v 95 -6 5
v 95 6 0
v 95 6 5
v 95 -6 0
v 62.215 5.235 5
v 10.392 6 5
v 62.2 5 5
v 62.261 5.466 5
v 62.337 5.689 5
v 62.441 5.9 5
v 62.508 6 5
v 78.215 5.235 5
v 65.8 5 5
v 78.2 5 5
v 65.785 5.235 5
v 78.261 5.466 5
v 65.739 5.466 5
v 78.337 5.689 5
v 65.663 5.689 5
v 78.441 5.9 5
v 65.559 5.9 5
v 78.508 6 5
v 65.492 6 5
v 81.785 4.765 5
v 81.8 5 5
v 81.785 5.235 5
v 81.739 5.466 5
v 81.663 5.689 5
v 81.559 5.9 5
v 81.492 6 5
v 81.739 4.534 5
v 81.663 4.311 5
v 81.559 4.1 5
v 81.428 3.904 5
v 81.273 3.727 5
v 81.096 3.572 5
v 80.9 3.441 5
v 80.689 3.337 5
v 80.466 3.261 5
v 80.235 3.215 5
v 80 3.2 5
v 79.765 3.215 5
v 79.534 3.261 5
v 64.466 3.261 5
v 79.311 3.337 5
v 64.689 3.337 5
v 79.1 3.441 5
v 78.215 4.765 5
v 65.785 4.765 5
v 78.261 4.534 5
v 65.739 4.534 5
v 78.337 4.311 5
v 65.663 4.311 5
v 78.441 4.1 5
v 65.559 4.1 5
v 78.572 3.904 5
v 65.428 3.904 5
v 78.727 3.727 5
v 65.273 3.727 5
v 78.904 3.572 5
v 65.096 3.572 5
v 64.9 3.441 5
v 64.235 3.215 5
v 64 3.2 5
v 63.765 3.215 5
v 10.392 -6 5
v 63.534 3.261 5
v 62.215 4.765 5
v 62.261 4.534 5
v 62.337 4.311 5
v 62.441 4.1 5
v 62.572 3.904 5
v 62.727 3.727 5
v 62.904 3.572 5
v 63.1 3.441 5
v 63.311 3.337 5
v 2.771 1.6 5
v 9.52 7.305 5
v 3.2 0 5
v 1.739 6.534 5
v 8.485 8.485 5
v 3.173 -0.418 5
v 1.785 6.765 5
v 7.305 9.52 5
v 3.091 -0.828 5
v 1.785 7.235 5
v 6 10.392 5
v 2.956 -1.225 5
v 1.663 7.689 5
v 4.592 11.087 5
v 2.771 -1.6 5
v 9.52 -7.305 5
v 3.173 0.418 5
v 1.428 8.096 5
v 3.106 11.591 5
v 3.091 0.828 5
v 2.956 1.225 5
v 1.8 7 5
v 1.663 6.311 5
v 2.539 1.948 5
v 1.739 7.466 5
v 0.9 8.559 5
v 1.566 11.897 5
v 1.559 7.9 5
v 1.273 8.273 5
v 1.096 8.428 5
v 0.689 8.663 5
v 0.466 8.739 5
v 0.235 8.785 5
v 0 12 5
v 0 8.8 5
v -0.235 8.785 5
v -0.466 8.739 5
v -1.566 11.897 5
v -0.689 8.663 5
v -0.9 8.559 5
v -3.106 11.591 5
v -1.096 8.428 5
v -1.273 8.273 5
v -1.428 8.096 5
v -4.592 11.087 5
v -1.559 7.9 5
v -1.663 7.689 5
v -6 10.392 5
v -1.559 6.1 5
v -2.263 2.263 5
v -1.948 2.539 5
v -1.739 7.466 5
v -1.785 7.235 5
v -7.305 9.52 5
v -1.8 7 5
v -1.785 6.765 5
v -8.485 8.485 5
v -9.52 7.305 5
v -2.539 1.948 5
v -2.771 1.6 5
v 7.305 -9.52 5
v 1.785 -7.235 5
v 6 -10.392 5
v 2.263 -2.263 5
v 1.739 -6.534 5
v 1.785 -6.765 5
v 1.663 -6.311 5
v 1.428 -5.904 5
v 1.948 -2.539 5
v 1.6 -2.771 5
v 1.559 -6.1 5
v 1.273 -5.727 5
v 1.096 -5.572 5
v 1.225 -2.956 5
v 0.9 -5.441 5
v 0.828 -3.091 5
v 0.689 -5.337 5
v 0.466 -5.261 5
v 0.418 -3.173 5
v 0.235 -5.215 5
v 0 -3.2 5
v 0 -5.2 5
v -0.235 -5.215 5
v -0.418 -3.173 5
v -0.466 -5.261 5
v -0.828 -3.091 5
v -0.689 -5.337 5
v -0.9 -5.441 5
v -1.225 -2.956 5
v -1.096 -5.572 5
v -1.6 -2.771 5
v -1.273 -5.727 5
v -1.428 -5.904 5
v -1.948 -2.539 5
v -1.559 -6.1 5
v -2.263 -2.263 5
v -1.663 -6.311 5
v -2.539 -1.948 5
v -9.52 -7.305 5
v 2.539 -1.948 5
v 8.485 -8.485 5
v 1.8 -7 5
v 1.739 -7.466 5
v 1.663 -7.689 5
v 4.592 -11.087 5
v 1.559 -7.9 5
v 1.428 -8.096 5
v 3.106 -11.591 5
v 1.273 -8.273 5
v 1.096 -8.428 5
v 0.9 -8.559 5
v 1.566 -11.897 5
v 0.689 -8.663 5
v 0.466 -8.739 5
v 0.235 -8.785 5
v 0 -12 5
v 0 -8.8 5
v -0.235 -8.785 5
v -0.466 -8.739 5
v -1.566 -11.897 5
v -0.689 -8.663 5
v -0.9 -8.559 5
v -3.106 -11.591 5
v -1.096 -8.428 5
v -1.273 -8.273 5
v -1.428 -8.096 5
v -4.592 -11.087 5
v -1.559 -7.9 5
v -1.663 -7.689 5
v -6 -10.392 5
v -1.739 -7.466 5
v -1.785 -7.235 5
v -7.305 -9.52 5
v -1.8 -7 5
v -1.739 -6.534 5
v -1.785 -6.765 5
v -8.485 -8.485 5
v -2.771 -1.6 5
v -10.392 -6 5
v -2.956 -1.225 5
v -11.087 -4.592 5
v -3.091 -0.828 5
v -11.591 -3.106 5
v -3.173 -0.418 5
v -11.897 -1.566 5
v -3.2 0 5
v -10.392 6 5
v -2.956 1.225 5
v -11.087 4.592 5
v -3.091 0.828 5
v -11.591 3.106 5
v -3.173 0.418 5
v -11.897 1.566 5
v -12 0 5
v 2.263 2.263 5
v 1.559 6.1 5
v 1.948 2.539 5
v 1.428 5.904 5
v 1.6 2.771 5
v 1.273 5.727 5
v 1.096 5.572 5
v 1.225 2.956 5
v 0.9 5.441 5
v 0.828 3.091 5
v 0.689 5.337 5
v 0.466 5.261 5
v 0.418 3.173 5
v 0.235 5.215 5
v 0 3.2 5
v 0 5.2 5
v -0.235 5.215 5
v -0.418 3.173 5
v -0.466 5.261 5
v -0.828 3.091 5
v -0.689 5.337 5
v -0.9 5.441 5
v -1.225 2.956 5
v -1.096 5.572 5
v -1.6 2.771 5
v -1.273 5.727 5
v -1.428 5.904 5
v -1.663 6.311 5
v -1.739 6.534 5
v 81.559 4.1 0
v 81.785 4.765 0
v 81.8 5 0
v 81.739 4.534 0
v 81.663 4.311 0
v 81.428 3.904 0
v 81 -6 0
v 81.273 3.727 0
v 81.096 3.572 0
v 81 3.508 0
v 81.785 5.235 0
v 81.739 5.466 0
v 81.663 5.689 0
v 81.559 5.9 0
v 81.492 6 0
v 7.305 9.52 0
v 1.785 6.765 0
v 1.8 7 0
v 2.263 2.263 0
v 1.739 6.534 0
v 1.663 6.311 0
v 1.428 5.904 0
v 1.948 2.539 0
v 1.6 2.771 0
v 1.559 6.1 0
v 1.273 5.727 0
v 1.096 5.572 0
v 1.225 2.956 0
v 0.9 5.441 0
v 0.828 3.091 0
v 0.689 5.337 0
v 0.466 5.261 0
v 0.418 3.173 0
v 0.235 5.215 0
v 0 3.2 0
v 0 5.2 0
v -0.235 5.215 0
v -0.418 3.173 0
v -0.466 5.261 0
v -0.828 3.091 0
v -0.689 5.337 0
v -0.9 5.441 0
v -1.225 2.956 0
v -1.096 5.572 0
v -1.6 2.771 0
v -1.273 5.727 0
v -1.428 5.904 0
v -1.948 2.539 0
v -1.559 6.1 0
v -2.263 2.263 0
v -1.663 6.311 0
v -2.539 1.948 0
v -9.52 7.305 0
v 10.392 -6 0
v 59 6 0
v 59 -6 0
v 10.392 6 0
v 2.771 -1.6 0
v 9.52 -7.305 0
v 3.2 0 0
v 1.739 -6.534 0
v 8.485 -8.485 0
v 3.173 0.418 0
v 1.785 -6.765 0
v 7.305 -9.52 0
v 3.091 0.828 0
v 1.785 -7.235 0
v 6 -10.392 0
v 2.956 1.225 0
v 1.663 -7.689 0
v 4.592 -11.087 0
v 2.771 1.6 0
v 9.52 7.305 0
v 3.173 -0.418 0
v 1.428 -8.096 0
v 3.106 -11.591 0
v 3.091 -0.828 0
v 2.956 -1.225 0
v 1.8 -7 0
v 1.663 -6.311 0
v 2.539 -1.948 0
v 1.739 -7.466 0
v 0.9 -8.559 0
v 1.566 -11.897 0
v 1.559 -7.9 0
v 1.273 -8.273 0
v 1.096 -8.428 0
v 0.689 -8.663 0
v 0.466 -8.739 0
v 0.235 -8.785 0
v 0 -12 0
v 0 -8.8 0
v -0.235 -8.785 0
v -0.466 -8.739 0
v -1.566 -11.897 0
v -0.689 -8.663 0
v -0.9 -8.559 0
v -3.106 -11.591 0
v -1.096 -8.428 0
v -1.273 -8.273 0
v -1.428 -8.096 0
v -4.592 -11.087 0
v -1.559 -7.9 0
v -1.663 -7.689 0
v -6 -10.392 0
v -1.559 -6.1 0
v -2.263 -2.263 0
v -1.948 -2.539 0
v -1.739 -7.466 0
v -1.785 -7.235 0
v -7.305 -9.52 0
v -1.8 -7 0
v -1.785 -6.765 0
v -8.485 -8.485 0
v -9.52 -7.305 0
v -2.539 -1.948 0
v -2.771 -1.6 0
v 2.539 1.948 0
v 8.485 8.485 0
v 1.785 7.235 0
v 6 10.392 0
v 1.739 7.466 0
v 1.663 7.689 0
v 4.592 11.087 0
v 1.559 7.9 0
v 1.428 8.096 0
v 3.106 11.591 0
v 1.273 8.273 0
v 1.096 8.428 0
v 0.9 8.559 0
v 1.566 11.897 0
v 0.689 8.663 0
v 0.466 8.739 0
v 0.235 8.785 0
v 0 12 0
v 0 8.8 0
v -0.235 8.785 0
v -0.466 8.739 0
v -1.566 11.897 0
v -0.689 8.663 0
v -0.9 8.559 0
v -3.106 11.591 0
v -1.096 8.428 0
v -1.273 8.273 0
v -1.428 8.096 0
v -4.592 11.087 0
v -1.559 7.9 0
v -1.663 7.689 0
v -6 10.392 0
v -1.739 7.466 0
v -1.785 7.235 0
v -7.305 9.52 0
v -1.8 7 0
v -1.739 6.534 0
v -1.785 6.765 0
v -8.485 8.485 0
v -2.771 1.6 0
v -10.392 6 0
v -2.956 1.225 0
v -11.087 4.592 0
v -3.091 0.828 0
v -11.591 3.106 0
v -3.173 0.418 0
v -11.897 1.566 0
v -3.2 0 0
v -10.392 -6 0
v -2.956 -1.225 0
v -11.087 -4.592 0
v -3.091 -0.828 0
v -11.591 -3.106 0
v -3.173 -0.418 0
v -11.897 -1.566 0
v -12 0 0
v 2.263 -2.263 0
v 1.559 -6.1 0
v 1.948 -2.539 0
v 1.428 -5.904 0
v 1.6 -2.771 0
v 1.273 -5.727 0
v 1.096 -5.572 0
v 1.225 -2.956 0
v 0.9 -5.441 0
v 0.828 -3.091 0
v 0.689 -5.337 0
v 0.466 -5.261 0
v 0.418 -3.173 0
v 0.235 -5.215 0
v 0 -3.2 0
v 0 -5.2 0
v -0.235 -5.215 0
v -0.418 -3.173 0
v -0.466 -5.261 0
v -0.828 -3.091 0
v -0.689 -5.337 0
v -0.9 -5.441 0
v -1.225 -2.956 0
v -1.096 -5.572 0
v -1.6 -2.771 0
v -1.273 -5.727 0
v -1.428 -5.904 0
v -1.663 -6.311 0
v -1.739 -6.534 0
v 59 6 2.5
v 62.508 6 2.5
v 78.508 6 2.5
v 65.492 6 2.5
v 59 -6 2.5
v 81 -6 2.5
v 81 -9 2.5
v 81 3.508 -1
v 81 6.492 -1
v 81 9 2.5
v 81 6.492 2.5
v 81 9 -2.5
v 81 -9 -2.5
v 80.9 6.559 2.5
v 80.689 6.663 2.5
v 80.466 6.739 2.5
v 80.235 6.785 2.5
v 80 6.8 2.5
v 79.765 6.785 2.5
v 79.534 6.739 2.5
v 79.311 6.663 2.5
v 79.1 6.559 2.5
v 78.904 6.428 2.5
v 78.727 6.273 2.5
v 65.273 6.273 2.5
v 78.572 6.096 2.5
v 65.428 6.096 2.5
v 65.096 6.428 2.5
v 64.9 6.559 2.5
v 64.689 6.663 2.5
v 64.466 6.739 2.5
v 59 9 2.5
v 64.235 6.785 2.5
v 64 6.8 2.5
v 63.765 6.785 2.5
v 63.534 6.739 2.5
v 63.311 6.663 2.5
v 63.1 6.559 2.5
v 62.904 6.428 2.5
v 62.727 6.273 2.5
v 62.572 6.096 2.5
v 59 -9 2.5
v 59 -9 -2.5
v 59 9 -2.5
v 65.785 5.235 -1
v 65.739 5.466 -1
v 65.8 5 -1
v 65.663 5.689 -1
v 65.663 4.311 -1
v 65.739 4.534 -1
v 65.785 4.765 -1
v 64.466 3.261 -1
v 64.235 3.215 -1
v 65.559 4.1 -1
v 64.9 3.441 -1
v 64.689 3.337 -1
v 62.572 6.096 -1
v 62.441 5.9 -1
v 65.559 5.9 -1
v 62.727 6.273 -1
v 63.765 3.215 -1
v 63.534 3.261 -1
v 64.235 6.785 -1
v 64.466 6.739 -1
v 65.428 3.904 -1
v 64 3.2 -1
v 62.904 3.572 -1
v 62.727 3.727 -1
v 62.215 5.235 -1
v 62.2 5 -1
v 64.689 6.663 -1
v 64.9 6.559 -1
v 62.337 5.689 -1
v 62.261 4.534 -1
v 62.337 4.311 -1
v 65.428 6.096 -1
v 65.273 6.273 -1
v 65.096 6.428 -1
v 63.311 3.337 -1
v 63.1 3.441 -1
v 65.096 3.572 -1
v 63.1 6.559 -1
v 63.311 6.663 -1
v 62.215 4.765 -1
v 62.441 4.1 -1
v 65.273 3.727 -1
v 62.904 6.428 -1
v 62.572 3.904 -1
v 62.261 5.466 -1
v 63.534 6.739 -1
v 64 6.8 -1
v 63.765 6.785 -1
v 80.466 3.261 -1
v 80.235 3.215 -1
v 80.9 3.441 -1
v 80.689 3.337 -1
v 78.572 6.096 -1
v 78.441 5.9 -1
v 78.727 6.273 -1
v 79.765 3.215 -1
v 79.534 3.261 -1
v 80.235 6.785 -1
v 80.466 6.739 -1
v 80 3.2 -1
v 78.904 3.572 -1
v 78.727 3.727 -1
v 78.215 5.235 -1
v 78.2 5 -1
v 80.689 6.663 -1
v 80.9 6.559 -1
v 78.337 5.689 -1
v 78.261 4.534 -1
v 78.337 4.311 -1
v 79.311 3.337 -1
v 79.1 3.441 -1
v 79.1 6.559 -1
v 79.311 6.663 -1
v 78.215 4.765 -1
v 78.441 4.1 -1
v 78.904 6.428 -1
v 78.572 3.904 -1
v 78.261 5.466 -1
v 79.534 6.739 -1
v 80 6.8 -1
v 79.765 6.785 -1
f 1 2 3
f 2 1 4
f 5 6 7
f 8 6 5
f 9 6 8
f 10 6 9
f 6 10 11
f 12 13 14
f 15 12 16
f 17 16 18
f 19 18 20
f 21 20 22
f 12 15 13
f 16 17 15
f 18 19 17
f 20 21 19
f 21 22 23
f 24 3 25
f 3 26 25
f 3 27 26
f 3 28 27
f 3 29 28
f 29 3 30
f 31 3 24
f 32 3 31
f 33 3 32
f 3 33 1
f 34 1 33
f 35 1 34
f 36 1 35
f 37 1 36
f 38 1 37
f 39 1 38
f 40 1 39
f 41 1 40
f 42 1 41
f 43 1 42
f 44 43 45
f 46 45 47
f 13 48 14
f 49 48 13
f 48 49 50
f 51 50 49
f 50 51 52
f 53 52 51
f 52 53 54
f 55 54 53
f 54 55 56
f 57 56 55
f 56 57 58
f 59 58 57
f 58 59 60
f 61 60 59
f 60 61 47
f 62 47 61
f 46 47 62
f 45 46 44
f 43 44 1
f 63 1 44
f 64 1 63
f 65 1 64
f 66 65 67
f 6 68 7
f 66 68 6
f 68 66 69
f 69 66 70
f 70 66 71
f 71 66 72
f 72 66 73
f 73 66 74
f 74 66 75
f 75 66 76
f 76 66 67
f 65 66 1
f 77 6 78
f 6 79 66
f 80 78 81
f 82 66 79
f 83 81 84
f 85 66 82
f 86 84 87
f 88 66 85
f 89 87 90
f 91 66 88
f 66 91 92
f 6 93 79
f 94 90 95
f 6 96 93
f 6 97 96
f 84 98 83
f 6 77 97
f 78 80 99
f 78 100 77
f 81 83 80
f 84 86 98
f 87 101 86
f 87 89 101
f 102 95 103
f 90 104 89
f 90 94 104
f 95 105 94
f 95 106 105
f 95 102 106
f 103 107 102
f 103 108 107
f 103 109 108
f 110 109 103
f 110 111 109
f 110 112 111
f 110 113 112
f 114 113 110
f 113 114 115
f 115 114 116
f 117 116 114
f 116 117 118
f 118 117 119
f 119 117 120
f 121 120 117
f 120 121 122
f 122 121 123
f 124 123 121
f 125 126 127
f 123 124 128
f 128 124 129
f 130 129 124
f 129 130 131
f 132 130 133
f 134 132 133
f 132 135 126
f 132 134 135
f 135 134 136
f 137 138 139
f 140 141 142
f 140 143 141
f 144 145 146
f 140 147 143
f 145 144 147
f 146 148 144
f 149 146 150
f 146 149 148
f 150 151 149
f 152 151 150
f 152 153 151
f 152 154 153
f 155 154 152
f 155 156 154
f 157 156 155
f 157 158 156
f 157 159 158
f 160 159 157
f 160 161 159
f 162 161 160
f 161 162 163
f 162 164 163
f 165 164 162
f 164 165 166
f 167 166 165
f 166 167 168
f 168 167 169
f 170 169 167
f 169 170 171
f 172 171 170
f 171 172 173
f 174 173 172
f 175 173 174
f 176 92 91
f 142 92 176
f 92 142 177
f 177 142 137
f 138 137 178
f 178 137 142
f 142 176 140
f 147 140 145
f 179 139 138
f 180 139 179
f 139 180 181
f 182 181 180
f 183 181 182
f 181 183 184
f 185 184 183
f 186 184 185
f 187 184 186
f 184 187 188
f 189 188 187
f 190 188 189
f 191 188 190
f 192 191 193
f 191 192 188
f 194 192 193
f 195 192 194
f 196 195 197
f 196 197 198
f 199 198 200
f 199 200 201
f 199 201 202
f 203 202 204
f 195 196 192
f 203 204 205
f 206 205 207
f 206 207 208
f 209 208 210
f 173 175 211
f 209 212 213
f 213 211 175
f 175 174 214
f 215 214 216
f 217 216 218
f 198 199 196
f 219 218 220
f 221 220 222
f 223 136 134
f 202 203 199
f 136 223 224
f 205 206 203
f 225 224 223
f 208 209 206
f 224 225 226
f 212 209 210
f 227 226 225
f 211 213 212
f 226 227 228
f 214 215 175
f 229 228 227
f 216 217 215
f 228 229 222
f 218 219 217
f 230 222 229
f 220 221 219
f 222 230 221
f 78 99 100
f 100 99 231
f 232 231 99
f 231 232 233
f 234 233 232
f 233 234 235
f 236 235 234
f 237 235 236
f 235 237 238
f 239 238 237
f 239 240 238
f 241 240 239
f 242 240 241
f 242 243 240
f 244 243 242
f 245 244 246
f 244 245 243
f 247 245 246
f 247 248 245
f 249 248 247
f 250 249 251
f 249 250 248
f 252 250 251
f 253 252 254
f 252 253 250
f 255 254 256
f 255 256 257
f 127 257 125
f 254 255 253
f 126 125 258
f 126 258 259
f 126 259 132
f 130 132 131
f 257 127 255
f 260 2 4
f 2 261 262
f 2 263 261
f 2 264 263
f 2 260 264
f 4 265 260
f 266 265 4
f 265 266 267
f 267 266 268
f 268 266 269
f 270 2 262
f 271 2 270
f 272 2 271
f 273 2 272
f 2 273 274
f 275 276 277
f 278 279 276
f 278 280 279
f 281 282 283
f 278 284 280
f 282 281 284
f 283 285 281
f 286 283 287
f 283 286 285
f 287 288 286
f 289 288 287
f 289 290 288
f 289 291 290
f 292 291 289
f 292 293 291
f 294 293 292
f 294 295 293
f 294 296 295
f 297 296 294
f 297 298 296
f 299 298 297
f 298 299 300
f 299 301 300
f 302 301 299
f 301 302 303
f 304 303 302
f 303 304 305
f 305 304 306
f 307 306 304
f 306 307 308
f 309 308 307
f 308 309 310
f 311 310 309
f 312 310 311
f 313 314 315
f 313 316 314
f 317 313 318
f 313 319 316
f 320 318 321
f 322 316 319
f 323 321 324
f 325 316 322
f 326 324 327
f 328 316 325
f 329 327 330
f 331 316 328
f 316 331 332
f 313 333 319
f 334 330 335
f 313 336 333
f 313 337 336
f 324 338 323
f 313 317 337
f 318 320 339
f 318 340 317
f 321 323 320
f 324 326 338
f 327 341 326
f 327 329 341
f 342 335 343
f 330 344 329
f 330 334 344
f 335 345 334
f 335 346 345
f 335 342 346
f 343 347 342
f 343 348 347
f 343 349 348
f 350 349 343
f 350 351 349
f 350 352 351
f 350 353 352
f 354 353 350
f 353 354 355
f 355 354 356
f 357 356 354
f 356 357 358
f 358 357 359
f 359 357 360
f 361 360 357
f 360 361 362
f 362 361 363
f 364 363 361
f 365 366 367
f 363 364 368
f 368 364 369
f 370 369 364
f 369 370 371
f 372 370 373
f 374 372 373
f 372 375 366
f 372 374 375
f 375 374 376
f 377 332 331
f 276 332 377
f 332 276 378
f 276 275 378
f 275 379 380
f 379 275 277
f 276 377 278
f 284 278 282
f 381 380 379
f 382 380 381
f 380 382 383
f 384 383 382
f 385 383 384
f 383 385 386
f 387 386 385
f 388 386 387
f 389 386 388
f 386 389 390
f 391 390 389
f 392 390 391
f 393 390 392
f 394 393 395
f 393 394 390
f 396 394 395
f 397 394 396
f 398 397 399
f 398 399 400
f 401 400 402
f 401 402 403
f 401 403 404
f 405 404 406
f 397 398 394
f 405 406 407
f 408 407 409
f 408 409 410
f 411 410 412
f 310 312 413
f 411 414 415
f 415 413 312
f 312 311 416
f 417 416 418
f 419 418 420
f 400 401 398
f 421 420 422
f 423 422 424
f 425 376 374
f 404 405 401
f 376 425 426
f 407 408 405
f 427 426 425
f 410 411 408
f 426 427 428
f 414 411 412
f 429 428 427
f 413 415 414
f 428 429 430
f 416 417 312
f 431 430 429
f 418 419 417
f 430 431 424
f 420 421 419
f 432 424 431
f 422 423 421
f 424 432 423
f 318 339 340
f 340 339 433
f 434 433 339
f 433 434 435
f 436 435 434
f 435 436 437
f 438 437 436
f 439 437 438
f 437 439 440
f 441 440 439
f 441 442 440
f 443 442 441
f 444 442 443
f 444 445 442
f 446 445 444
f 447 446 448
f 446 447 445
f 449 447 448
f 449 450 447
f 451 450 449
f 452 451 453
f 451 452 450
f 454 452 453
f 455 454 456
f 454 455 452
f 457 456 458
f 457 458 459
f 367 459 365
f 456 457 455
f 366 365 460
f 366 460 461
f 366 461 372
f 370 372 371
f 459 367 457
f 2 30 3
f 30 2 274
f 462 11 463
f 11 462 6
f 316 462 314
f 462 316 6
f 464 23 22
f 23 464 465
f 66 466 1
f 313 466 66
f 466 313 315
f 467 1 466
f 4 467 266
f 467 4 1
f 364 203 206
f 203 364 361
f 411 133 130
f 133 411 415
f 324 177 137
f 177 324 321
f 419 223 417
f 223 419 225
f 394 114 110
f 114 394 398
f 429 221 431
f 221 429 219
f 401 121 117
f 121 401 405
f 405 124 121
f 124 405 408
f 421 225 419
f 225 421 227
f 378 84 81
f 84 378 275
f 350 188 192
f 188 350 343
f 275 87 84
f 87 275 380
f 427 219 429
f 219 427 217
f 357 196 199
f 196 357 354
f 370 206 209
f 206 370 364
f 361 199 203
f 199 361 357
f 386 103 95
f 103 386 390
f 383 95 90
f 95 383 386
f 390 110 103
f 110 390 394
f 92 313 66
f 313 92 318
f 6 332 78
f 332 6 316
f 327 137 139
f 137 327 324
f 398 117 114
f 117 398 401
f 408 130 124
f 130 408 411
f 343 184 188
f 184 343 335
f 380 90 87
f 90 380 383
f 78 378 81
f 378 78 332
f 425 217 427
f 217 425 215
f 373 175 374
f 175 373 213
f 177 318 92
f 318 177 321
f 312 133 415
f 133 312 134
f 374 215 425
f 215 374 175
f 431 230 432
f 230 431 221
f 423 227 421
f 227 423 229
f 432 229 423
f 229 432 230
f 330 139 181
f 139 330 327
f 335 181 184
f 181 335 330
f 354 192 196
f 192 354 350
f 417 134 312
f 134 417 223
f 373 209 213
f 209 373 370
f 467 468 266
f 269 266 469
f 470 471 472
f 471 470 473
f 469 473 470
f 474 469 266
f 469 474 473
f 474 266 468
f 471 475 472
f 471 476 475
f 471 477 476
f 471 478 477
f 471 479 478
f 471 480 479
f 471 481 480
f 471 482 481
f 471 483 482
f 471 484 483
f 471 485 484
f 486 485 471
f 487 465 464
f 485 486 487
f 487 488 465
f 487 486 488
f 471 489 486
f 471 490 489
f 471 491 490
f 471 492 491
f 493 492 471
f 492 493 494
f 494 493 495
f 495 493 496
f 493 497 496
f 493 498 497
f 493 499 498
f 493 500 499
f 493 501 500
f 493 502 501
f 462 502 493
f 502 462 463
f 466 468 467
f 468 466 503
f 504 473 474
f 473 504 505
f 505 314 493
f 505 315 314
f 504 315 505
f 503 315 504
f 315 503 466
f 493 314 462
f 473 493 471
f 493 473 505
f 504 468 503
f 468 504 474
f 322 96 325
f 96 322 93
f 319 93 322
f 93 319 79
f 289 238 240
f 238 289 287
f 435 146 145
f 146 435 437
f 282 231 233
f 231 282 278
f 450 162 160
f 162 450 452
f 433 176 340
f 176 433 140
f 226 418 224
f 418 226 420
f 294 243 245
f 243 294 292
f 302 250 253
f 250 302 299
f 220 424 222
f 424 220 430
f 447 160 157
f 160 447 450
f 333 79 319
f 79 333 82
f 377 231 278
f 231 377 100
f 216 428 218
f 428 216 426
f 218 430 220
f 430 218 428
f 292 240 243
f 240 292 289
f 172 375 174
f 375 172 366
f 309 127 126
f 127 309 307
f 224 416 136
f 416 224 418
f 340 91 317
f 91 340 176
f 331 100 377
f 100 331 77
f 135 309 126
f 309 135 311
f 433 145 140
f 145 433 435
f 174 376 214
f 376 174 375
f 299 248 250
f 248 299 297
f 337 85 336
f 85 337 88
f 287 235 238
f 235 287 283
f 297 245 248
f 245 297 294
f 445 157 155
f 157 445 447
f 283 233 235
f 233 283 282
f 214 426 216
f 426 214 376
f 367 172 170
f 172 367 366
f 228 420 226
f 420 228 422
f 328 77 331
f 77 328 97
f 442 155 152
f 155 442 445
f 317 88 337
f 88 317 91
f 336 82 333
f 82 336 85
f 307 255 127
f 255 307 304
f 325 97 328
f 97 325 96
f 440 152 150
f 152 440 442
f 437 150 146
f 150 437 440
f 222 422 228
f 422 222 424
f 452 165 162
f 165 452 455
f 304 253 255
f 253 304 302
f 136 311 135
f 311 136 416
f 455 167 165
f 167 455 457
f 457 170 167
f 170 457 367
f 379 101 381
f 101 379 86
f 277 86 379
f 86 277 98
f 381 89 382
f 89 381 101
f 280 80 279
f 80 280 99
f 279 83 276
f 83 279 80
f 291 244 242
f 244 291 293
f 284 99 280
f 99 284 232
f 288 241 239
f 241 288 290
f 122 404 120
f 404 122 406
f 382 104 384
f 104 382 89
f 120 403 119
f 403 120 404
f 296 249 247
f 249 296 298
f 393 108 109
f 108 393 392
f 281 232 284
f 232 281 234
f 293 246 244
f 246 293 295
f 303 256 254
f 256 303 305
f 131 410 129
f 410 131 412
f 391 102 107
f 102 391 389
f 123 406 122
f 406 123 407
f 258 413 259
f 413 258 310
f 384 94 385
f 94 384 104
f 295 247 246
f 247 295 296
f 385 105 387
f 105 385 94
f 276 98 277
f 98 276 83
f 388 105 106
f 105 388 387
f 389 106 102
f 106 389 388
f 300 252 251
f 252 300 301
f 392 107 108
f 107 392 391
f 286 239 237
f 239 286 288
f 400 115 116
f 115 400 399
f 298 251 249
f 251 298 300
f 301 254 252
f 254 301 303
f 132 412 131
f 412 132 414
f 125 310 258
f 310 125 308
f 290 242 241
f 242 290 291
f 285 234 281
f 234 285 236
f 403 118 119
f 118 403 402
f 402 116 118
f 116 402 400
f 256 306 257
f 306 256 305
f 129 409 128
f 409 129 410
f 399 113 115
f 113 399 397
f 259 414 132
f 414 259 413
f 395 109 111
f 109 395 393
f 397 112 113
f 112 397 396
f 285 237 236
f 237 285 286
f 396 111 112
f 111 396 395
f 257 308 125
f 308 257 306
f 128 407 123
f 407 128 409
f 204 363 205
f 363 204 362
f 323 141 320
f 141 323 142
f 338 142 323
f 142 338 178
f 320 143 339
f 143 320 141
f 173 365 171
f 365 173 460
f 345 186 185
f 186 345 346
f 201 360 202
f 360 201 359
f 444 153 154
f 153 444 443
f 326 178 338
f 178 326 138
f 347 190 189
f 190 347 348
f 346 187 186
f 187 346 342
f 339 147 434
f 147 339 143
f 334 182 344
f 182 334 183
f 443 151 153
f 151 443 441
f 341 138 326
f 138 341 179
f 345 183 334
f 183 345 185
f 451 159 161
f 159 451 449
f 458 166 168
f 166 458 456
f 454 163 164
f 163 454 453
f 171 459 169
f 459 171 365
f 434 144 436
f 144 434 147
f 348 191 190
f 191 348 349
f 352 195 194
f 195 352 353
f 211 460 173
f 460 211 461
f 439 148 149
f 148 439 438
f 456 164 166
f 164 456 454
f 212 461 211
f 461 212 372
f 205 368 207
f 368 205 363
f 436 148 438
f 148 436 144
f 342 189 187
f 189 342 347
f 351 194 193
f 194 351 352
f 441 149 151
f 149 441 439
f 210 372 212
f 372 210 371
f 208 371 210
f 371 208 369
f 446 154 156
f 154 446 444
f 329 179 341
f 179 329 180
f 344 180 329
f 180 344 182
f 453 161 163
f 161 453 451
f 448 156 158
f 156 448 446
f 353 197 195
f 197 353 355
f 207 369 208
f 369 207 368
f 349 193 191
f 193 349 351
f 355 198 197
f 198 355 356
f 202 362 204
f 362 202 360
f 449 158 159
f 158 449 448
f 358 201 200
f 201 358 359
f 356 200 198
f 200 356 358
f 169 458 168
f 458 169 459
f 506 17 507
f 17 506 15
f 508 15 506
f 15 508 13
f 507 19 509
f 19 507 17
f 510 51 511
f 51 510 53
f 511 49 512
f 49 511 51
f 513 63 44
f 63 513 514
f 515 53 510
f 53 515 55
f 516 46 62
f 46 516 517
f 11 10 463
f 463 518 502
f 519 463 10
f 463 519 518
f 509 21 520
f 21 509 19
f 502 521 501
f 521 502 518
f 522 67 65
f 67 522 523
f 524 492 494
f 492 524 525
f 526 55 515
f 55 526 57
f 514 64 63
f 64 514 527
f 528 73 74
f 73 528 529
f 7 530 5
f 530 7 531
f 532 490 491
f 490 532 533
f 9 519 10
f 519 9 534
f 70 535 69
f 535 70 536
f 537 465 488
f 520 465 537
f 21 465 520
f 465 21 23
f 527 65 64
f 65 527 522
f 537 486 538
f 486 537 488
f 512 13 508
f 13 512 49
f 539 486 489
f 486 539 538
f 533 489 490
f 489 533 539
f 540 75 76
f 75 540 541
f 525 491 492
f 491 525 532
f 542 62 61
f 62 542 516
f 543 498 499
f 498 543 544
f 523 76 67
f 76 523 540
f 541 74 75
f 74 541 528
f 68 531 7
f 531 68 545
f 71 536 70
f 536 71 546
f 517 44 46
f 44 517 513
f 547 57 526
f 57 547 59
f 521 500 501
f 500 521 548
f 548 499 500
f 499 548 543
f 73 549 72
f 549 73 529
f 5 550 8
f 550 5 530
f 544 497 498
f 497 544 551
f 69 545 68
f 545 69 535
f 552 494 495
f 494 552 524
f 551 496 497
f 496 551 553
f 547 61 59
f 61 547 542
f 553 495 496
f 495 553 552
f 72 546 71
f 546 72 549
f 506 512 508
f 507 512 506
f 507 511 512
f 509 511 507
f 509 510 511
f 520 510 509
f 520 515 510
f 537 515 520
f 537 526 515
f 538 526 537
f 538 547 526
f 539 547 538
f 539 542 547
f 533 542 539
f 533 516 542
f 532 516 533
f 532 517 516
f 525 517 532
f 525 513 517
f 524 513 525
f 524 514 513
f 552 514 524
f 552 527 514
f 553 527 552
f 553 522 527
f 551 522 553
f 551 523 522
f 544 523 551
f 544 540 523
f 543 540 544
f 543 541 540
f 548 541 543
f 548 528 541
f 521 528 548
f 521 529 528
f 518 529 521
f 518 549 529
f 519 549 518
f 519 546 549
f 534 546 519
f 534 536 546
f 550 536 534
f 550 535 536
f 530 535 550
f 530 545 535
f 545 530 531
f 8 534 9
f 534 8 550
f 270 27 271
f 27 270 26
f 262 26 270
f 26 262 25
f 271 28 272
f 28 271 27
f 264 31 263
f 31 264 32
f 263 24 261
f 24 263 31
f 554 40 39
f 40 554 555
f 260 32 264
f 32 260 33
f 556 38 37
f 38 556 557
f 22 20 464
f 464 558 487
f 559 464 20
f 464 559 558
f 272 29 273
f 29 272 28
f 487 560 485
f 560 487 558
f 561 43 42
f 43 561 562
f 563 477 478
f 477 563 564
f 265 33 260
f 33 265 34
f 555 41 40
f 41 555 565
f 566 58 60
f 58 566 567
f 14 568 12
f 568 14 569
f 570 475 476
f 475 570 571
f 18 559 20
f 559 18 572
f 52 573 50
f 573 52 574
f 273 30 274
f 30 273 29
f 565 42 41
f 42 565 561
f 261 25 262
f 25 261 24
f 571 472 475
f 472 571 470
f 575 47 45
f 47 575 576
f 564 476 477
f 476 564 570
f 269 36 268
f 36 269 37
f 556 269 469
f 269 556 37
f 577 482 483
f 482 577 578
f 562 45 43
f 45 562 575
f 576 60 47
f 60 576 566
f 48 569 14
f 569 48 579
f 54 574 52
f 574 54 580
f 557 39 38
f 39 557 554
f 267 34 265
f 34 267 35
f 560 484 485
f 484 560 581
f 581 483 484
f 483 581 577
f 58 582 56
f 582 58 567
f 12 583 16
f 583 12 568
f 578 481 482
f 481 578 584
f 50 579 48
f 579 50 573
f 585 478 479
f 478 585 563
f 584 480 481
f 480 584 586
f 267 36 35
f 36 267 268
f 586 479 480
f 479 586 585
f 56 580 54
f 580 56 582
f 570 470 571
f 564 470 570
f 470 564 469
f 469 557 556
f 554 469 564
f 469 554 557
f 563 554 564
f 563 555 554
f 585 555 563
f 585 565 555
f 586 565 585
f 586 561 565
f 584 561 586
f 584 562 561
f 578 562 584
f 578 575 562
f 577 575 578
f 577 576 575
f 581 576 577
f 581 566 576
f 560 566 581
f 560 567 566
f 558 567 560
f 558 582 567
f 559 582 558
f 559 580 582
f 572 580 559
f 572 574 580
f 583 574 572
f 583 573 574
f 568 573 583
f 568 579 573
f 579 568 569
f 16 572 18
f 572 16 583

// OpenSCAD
$fn=48;
difference(){union(){translate([0,-6,0])cube([95,12,5]);translate([0,0,0])cylinder(h=5,r=12);translate([70,0,0])cube([22,18,5],center=true);}translate([0,0,-1])cylinder(h=7,r=3.2);translate([0,7,-1])cylinder(h=7,r=1.8);translate([0,-7,-1])cylinder(h=7,r=1.8);translate([64,5,-1])cylinder(h=7,r=1.8);translate([80,5,-1])cylinder(h=7,r=1.8);}
